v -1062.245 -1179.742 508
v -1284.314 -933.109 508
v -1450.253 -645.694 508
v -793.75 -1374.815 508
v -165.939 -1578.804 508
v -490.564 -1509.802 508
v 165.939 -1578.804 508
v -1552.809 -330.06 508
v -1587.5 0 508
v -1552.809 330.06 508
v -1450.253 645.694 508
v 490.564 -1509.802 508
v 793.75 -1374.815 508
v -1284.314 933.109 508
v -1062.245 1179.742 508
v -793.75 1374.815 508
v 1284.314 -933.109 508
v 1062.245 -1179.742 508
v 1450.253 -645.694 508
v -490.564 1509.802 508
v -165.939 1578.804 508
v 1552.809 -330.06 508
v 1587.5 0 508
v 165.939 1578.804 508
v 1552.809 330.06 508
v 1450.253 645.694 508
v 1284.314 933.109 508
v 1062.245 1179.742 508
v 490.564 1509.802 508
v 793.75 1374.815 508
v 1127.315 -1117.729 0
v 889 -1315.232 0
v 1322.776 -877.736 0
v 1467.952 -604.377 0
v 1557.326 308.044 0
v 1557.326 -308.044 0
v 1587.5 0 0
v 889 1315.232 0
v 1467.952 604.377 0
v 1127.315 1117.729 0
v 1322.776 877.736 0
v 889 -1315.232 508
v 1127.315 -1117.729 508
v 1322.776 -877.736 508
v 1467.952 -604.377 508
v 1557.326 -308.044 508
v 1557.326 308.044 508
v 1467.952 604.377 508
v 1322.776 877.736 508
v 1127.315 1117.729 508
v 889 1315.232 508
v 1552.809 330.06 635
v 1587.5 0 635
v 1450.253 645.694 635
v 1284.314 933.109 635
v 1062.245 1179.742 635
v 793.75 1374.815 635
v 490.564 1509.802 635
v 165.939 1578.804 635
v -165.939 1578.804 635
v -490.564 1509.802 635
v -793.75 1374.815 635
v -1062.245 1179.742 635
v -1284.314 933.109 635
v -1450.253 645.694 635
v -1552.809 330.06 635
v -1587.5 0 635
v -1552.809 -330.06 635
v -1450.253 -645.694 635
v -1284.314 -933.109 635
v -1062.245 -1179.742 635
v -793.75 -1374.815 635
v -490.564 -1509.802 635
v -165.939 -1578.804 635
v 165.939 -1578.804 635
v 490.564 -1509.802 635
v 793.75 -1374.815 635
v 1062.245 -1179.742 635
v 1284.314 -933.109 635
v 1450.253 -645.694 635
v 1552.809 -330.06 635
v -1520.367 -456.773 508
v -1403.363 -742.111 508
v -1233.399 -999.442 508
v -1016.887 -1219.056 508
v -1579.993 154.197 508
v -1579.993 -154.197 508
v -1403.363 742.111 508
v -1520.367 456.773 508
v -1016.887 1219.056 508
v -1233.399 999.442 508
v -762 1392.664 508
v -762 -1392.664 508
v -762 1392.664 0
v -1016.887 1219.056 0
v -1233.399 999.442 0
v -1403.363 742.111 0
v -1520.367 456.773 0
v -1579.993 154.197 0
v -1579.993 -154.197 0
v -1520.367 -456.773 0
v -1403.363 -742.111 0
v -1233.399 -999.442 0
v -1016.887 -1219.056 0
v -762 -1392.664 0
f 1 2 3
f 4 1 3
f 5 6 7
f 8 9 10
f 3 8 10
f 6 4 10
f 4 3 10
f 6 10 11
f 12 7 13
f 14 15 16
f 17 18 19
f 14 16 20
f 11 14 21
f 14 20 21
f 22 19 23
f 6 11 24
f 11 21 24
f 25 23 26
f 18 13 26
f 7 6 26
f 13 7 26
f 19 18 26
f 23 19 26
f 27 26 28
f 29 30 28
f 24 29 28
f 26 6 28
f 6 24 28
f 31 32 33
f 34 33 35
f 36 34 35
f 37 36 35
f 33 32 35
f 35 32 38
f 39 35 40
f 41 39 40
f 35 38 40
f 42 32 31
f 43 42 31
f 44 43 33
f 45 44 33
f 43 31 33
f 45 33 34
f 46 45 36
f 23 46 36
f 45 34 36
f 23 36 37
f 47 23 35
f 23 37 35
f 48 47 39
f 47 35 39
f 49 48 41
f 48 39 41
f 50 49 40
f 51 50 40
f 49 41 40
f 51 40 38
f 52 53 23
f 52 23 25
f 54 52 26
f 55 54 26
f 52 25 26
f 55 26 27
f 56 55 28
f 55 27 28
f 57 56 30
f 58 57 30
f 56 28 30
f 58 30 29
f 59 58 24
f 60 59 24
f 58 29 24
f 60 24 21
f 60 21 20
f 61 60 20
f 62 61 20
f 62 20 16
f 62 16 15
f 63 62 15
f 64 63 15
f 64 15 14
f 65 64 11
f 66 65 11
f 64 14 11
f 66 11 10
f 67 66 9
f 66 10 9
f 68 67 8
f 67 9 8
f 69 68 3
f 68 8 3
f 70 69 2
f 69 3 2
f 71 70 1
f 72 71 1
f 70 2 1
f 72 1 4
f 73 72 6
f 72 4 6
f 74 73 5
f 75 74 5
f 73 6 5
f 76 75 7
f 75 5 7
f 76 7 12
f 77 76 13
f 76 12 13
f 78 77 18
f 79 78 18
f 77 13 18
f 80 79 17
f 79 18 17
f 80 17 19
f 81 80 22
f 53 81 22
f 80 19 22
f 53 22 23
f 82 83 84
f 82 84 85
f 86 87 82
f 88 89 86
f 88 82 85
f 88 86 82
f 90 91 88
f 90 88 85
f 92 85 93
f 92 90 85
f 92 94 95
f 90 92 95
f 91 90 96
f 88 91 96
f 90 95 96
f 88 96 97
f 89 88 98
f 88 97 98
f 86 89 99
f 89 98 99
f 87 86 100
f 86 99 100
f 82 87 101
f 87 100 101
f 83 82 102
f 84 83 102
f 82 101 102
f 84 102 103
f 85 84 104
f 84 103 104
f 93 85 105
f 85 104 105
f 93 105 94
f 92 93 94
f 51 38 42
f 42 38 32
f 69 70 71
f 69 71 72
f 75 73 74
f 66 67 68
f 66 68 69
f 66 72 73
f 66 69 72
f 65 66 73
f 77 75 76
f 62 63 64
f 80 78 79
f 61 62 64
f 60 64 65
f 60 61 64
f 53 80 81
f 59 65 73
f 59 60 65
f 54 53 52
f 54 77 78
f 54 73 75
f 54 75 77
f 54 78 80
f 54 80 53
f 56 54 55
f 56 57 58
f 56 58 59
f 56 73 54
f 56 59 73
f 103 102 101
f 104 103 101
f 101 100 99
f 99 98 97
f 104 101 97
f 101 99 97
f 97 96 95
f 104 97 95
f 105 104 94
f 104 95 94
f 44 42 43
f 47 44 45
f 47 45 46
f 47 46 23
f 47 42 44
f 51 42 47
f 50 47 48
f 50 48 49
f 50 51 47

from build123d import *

# Parameters (mm, degrees)
F1_DEPTH = 508
F3_R     = 1587.5
F4_DEPTH = 127


with BuildPart() as f1:
    # F0 (on Top) → F1 (new body)
    with BuildSketch(Plane.XY):
        with BuildLine():
            Line((-762, -1392.6637246658), (-762, 1392.6637246658))
            ThreePointArc((-762, 1392.6637246658), (-1587.5, 0), (-762, -1392.6637246658))
        make_face()
    extrude(amount=F1_DEPTH)


with BuildPart() as f1b:
    # F0 (on Top) → F1, piece 2 (new body)
    with BuildSketch(Plane.XY):
        with BuildLine():
            ThreePointArc((889, -1315.2320137527), (1402.0420375296, -744.6035018719), (1587.5, 0))
            ThreePointArc((1587.5, 0), (1402.0420375296, 744.6035018719), (889, 1315.2320137527))
            Line((889, 1315.2320137527), (889, -1315.2320137527))
        make_face()
    extrude(amount=F1_DEPTH)


with BuildPart() as f4:
    # F3 (on 3pt) → F4 (new body)
    with BuildSketch(Plane.XY.offset(508)):
        Circle(F3_R)
    extrude(amount=F4_DEPTH)


solid = Compound([f1.part, f1b.part, f4.part])
